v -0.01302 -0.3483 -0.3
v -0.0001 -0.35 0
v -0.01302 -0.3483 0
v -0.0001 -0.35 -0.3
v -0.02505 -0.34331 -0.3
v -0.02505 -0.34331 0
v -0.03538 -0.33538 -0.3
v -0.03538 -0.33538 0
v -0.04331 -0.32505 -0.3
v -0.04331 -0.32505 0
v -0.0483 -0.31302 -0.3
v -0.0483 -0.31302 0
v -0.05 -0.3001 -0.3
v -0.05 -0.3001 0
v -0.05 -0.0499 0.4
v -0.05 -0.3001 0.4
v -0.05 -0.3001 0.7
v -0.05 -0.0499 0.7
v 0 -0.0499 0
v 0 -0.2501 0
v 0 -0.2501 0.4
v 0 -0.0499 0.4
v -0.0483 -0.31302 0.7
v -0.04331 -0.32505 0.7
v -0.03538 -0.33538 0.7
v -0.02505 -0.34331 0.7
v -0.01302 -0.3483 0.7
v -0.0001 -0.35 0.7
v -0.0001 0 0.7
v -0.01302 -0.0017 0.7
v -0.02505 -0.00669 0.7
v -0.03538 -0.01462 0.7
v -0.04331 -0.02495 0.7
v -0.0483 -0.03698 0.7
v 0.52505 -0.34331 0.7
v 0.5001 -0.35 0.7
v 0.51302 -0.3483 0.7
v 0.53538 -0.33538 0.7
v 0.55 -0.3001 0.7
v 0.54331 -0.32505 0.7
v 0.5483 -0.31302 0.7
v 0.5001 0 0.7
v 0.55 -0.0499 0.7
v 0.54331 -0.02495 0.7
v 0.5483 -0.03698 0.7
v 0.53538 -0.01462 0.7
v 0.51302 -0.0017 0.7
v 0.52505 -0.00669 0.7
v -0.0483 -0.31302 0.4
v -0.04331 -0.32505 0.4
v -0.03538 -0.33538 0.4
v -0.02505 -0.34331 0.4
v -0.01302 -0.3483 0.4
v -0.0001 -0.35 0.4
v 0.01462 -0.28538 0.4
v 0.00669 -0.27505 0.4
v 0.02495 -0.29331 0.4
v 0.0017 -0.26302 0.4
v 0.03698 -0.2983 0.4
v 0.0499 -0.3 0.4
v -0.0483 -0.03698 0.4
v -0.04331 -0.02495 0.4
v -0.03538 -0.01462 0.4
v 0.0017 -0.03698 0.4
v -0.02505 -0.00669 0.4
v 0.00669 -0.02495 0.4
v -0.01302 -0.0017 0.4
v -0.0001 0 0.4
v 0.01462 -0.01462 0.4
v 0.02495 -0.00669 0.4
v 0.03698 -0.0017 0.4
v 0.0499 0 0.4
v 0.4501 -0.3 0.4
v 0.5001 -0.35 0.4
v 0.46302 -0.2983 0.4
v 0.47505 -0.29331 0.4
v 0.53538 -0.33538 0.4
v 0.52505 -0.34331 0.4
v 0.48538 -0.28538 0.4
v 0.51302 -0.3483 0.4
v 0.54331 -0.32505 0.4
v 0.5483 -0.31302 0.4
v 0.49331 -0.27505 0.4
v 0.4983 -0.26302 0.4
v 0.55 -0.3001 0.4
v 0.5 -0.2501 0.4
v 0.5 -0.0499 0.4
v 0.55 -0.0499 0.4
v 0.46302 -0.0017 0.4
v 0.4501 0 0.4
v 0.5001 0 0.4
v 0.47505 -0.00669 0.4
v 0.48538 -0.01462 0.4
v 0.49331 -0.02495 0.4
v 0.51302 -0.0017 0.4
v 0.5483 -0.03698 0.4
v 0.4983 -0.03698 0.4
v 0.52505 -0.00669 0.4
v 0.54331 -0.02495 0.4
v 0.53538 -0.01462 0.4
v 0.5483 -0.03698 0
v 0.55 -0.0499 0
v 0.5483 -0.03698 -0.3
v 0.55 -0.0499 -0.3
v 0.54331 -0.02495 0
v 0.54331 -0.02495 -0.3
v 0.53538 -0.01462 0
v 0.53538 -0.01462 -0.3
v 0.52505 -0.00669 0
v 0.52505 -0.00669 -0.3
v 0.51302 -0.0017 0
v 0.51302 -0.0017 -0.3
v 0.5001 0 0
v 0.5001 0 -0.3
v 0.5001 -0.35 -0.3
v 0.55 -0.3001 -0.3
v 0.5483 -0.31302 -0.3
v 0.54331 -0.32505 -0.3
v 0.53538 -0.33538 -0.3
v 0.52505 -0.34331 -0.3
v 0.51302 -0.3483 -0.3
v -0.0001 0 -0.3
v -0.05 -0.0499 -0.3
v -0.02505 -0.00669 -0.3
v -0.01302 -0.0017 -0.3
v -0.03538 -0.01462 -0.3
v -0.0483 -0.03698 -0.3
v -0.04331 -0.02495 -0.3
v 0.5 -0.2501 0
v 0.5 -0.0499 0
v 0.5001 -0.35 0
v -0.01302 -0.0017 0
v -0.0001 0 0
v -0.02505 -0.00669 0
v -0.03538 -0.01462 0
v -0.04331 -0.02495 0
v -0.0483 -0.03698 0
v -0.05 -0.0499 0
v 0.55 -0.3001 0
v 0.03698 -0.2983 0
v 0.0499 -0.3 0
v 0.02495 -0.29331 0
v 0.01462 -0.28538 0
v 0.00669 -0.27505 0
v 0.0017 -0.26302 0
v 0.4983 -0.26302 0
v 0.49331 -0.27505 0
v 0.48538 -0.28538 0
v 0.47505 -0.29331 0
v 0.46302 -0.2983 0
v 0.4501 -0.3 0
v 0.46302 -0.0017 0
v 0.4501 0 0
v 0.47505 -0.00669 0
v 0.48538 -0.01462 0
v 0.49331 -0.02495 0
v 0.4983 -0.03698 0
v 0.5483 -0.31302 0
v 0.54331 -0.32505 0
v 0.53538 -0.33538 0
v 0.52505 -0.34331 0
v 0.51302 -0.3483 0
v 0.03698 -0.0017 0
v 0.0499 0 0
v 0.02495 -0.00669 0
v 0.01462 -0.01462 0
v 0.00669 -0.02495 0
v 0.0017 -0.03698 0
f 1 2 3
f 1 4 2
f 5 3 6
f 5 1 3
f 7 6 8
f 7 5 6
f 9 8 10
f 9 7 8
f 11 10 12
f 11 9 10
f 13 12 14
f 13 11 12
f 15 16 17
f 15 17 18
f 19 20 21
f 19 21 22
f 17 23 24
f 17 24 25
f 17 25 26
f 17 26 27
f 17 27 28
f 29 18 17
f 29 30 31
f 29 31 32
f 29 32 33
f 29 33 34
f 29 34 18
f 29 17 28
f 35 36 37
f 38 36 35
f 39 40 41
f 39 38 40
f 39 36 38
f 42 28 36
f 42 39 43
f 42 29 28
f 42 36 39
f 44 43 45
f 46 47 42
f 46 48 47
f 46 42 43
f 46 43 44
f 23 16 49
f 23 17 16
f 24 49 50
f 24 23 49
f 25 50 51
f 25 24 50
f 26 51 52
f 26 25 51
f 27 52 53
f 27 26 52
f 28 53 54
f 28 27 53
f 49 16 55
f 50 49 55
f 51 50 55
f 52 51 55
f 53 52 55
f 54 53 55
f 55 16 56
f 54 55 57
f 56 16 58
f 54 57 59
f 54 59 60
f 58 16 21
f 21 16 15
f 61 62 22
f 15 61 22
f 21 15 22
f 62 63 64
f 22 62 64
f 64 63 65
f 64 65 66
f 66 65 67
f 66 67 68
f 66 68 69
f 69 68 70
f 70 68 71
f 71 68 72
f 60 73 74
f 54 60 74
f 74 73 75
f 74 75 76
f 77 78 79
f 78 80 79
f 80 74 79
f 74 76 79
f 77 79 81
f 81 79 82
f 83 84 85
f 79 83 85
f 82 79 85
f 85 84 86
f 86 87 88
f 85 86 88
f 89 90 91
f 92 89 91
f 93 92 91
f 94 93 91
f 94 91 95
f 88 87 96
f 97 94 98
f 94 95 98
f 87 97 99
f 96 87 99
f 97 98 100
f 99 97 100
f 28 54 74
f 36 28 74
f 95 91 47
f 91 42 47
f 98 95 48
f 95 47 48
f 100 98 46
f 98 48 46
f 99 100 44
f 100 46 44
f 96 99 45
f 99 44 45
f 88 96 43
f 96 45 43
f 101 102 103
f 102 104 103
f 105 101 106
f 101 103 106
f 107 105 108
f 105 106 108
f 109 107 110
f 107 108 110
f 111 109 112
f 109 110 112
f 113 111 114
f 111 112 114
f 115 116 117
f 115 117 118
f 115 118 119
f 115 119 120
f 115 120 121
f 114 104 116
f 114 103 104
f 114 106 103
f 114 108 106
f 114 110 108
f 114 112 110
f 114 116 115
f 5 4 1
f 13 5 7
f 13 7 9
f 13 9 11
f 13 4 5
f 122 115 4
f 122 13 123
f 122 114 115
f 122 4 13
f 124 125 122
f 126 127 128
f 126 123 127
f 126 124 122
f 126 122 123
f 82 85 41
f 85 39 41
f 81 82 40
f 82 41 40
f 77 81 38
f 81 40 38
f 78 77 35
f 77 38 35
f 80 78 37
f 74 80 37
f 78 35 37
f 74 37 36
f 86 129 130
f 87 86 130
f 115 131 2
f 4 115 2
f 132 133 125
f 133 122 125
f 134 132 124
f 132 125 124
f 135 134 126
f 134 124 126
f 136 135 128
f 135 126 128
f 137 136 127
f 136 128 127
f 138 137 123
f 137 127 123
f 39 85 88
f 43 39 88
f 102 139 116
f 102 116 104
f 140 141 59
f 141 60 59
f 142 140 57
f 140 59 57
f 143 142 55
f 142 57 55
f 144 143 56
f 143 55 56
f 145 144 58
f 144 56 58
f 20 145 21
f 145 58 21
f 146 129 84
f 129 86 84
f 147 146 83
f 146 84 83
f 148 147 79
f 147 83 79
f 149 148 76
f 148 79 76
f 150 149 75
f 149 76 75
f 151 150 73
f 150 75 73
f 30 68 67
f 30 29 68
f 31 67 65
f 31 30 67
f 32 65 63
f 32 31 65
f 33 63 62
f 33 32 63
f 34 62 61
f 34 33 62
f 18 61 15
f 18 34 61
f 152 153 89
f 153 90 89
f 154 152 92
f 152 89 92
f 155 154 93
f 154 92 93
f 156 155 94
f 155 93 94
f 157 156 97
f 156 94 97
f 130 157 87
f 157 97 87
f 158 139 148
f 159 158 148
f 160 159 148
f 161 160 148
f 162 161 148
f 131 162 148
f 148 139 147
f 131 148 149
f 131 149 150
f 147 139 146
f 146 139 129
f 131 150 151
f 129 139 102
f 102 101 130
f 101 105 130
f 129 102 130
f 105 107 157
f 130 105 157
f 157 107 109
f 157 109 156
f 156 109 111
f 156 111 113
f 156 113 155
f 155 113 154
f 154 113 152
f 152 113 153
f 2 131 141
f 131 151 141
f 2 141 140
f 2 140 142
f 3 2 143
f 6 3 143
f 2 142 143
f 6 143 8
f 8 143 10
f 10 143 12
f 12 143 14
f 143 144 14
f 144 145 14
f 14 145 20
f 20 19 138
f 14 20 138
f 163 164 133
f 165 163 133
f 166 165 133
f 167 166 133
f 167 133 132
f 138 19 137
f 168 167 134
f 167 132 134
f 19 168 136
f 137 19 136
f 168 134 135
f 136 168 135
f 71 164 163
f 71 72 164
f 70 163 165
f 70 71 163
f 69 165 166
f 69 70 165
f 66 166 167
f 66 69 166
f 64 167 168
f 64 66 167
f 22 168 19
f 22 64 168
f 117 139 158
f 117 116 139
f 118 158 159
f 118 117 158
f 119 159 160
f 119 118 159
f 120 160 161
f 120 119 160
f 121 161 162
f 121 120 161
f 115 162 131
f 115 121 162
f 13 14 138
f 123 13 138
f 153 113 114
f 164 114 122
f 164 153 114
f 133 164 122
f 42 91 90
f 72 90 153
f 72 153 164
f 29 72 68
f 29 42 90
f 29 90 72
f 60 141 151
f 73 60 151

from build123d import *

# Parameters (mm, degrees)
SKETCH2_W           = 0.5
SKETCH2_H           = 0.3
BOSS_EXTRUDE1_DEPTH = 0.4
SKETCH3_W           = 0.6
SKETCH3_H           = 0.35
BOSS_EXTRUDE2_DEPTH = 0.3
SKETCH4_W           = 0.6
SKETCH4_H           = 0.35
BOSS_EXTRUDE4_DEPTH = 0.3
FILLET2_R           = 0.05


with BuildPart() as part:
    # Sketch2 → Boss-Extrude1 (new body)
    with BuildSketch(Plane.XY):
        with Locations((0.25, -0.15)):
            Rectangle(SKETCH2_W, SKETCH2_H)
    extrude(amount=BOSS_EXTRUDE1_DEPTH)

    # Sketch3 → Boss-Extrude2 (add)
    with BuildSketch(Plane.XY.offset(0.4)):
        with Locations((0.25, -0.175)):
            Rectangle(SKETCH3_W, SKETCH3_H)
    extrude(amount=BOSS_EXTRUDE2_DEPTH)

    # Sketch4 → Boss-Extrude4 (add)
    with BuildSketch(Plane(origin=(0, 0, 0), x_dir=(-1, 0, 0), z_dir=(0, 0, -1))):
        with Locations((-0.25, -0.175)):
            Rectangle(SKETCH4_W, SKETCH4_H)
    extrude(amount=BOSS_EXTRUDE4_DEPTH)

    # Fillet2
    fillet2_edges = [part.edges().sort_by_distance(p)[0] for p in [
        (0.55, -0.35, 0.55),
        (-0.05, -0.35, 0.55),
        (-0.05, -0.35, -0.15),
        (0.55, -0.35, -0.15),
        (0.5, -0.3, 0.2),
        (0, -0.3, 0.2),
        (0.55, 0, 0.55),
        (-0.05, 0, 0.55),
        (0, 0, 0.2),
        (0.5, 0, 0.2),
        (0.55, 0, -0.15),
        (-0.05, 0, -0.15),
    ]]
    fillet(fillet2_edges, radius=FILLET2_R - 0.0001)  # a hair under: the kernel refuses the full size


solid = part.part
